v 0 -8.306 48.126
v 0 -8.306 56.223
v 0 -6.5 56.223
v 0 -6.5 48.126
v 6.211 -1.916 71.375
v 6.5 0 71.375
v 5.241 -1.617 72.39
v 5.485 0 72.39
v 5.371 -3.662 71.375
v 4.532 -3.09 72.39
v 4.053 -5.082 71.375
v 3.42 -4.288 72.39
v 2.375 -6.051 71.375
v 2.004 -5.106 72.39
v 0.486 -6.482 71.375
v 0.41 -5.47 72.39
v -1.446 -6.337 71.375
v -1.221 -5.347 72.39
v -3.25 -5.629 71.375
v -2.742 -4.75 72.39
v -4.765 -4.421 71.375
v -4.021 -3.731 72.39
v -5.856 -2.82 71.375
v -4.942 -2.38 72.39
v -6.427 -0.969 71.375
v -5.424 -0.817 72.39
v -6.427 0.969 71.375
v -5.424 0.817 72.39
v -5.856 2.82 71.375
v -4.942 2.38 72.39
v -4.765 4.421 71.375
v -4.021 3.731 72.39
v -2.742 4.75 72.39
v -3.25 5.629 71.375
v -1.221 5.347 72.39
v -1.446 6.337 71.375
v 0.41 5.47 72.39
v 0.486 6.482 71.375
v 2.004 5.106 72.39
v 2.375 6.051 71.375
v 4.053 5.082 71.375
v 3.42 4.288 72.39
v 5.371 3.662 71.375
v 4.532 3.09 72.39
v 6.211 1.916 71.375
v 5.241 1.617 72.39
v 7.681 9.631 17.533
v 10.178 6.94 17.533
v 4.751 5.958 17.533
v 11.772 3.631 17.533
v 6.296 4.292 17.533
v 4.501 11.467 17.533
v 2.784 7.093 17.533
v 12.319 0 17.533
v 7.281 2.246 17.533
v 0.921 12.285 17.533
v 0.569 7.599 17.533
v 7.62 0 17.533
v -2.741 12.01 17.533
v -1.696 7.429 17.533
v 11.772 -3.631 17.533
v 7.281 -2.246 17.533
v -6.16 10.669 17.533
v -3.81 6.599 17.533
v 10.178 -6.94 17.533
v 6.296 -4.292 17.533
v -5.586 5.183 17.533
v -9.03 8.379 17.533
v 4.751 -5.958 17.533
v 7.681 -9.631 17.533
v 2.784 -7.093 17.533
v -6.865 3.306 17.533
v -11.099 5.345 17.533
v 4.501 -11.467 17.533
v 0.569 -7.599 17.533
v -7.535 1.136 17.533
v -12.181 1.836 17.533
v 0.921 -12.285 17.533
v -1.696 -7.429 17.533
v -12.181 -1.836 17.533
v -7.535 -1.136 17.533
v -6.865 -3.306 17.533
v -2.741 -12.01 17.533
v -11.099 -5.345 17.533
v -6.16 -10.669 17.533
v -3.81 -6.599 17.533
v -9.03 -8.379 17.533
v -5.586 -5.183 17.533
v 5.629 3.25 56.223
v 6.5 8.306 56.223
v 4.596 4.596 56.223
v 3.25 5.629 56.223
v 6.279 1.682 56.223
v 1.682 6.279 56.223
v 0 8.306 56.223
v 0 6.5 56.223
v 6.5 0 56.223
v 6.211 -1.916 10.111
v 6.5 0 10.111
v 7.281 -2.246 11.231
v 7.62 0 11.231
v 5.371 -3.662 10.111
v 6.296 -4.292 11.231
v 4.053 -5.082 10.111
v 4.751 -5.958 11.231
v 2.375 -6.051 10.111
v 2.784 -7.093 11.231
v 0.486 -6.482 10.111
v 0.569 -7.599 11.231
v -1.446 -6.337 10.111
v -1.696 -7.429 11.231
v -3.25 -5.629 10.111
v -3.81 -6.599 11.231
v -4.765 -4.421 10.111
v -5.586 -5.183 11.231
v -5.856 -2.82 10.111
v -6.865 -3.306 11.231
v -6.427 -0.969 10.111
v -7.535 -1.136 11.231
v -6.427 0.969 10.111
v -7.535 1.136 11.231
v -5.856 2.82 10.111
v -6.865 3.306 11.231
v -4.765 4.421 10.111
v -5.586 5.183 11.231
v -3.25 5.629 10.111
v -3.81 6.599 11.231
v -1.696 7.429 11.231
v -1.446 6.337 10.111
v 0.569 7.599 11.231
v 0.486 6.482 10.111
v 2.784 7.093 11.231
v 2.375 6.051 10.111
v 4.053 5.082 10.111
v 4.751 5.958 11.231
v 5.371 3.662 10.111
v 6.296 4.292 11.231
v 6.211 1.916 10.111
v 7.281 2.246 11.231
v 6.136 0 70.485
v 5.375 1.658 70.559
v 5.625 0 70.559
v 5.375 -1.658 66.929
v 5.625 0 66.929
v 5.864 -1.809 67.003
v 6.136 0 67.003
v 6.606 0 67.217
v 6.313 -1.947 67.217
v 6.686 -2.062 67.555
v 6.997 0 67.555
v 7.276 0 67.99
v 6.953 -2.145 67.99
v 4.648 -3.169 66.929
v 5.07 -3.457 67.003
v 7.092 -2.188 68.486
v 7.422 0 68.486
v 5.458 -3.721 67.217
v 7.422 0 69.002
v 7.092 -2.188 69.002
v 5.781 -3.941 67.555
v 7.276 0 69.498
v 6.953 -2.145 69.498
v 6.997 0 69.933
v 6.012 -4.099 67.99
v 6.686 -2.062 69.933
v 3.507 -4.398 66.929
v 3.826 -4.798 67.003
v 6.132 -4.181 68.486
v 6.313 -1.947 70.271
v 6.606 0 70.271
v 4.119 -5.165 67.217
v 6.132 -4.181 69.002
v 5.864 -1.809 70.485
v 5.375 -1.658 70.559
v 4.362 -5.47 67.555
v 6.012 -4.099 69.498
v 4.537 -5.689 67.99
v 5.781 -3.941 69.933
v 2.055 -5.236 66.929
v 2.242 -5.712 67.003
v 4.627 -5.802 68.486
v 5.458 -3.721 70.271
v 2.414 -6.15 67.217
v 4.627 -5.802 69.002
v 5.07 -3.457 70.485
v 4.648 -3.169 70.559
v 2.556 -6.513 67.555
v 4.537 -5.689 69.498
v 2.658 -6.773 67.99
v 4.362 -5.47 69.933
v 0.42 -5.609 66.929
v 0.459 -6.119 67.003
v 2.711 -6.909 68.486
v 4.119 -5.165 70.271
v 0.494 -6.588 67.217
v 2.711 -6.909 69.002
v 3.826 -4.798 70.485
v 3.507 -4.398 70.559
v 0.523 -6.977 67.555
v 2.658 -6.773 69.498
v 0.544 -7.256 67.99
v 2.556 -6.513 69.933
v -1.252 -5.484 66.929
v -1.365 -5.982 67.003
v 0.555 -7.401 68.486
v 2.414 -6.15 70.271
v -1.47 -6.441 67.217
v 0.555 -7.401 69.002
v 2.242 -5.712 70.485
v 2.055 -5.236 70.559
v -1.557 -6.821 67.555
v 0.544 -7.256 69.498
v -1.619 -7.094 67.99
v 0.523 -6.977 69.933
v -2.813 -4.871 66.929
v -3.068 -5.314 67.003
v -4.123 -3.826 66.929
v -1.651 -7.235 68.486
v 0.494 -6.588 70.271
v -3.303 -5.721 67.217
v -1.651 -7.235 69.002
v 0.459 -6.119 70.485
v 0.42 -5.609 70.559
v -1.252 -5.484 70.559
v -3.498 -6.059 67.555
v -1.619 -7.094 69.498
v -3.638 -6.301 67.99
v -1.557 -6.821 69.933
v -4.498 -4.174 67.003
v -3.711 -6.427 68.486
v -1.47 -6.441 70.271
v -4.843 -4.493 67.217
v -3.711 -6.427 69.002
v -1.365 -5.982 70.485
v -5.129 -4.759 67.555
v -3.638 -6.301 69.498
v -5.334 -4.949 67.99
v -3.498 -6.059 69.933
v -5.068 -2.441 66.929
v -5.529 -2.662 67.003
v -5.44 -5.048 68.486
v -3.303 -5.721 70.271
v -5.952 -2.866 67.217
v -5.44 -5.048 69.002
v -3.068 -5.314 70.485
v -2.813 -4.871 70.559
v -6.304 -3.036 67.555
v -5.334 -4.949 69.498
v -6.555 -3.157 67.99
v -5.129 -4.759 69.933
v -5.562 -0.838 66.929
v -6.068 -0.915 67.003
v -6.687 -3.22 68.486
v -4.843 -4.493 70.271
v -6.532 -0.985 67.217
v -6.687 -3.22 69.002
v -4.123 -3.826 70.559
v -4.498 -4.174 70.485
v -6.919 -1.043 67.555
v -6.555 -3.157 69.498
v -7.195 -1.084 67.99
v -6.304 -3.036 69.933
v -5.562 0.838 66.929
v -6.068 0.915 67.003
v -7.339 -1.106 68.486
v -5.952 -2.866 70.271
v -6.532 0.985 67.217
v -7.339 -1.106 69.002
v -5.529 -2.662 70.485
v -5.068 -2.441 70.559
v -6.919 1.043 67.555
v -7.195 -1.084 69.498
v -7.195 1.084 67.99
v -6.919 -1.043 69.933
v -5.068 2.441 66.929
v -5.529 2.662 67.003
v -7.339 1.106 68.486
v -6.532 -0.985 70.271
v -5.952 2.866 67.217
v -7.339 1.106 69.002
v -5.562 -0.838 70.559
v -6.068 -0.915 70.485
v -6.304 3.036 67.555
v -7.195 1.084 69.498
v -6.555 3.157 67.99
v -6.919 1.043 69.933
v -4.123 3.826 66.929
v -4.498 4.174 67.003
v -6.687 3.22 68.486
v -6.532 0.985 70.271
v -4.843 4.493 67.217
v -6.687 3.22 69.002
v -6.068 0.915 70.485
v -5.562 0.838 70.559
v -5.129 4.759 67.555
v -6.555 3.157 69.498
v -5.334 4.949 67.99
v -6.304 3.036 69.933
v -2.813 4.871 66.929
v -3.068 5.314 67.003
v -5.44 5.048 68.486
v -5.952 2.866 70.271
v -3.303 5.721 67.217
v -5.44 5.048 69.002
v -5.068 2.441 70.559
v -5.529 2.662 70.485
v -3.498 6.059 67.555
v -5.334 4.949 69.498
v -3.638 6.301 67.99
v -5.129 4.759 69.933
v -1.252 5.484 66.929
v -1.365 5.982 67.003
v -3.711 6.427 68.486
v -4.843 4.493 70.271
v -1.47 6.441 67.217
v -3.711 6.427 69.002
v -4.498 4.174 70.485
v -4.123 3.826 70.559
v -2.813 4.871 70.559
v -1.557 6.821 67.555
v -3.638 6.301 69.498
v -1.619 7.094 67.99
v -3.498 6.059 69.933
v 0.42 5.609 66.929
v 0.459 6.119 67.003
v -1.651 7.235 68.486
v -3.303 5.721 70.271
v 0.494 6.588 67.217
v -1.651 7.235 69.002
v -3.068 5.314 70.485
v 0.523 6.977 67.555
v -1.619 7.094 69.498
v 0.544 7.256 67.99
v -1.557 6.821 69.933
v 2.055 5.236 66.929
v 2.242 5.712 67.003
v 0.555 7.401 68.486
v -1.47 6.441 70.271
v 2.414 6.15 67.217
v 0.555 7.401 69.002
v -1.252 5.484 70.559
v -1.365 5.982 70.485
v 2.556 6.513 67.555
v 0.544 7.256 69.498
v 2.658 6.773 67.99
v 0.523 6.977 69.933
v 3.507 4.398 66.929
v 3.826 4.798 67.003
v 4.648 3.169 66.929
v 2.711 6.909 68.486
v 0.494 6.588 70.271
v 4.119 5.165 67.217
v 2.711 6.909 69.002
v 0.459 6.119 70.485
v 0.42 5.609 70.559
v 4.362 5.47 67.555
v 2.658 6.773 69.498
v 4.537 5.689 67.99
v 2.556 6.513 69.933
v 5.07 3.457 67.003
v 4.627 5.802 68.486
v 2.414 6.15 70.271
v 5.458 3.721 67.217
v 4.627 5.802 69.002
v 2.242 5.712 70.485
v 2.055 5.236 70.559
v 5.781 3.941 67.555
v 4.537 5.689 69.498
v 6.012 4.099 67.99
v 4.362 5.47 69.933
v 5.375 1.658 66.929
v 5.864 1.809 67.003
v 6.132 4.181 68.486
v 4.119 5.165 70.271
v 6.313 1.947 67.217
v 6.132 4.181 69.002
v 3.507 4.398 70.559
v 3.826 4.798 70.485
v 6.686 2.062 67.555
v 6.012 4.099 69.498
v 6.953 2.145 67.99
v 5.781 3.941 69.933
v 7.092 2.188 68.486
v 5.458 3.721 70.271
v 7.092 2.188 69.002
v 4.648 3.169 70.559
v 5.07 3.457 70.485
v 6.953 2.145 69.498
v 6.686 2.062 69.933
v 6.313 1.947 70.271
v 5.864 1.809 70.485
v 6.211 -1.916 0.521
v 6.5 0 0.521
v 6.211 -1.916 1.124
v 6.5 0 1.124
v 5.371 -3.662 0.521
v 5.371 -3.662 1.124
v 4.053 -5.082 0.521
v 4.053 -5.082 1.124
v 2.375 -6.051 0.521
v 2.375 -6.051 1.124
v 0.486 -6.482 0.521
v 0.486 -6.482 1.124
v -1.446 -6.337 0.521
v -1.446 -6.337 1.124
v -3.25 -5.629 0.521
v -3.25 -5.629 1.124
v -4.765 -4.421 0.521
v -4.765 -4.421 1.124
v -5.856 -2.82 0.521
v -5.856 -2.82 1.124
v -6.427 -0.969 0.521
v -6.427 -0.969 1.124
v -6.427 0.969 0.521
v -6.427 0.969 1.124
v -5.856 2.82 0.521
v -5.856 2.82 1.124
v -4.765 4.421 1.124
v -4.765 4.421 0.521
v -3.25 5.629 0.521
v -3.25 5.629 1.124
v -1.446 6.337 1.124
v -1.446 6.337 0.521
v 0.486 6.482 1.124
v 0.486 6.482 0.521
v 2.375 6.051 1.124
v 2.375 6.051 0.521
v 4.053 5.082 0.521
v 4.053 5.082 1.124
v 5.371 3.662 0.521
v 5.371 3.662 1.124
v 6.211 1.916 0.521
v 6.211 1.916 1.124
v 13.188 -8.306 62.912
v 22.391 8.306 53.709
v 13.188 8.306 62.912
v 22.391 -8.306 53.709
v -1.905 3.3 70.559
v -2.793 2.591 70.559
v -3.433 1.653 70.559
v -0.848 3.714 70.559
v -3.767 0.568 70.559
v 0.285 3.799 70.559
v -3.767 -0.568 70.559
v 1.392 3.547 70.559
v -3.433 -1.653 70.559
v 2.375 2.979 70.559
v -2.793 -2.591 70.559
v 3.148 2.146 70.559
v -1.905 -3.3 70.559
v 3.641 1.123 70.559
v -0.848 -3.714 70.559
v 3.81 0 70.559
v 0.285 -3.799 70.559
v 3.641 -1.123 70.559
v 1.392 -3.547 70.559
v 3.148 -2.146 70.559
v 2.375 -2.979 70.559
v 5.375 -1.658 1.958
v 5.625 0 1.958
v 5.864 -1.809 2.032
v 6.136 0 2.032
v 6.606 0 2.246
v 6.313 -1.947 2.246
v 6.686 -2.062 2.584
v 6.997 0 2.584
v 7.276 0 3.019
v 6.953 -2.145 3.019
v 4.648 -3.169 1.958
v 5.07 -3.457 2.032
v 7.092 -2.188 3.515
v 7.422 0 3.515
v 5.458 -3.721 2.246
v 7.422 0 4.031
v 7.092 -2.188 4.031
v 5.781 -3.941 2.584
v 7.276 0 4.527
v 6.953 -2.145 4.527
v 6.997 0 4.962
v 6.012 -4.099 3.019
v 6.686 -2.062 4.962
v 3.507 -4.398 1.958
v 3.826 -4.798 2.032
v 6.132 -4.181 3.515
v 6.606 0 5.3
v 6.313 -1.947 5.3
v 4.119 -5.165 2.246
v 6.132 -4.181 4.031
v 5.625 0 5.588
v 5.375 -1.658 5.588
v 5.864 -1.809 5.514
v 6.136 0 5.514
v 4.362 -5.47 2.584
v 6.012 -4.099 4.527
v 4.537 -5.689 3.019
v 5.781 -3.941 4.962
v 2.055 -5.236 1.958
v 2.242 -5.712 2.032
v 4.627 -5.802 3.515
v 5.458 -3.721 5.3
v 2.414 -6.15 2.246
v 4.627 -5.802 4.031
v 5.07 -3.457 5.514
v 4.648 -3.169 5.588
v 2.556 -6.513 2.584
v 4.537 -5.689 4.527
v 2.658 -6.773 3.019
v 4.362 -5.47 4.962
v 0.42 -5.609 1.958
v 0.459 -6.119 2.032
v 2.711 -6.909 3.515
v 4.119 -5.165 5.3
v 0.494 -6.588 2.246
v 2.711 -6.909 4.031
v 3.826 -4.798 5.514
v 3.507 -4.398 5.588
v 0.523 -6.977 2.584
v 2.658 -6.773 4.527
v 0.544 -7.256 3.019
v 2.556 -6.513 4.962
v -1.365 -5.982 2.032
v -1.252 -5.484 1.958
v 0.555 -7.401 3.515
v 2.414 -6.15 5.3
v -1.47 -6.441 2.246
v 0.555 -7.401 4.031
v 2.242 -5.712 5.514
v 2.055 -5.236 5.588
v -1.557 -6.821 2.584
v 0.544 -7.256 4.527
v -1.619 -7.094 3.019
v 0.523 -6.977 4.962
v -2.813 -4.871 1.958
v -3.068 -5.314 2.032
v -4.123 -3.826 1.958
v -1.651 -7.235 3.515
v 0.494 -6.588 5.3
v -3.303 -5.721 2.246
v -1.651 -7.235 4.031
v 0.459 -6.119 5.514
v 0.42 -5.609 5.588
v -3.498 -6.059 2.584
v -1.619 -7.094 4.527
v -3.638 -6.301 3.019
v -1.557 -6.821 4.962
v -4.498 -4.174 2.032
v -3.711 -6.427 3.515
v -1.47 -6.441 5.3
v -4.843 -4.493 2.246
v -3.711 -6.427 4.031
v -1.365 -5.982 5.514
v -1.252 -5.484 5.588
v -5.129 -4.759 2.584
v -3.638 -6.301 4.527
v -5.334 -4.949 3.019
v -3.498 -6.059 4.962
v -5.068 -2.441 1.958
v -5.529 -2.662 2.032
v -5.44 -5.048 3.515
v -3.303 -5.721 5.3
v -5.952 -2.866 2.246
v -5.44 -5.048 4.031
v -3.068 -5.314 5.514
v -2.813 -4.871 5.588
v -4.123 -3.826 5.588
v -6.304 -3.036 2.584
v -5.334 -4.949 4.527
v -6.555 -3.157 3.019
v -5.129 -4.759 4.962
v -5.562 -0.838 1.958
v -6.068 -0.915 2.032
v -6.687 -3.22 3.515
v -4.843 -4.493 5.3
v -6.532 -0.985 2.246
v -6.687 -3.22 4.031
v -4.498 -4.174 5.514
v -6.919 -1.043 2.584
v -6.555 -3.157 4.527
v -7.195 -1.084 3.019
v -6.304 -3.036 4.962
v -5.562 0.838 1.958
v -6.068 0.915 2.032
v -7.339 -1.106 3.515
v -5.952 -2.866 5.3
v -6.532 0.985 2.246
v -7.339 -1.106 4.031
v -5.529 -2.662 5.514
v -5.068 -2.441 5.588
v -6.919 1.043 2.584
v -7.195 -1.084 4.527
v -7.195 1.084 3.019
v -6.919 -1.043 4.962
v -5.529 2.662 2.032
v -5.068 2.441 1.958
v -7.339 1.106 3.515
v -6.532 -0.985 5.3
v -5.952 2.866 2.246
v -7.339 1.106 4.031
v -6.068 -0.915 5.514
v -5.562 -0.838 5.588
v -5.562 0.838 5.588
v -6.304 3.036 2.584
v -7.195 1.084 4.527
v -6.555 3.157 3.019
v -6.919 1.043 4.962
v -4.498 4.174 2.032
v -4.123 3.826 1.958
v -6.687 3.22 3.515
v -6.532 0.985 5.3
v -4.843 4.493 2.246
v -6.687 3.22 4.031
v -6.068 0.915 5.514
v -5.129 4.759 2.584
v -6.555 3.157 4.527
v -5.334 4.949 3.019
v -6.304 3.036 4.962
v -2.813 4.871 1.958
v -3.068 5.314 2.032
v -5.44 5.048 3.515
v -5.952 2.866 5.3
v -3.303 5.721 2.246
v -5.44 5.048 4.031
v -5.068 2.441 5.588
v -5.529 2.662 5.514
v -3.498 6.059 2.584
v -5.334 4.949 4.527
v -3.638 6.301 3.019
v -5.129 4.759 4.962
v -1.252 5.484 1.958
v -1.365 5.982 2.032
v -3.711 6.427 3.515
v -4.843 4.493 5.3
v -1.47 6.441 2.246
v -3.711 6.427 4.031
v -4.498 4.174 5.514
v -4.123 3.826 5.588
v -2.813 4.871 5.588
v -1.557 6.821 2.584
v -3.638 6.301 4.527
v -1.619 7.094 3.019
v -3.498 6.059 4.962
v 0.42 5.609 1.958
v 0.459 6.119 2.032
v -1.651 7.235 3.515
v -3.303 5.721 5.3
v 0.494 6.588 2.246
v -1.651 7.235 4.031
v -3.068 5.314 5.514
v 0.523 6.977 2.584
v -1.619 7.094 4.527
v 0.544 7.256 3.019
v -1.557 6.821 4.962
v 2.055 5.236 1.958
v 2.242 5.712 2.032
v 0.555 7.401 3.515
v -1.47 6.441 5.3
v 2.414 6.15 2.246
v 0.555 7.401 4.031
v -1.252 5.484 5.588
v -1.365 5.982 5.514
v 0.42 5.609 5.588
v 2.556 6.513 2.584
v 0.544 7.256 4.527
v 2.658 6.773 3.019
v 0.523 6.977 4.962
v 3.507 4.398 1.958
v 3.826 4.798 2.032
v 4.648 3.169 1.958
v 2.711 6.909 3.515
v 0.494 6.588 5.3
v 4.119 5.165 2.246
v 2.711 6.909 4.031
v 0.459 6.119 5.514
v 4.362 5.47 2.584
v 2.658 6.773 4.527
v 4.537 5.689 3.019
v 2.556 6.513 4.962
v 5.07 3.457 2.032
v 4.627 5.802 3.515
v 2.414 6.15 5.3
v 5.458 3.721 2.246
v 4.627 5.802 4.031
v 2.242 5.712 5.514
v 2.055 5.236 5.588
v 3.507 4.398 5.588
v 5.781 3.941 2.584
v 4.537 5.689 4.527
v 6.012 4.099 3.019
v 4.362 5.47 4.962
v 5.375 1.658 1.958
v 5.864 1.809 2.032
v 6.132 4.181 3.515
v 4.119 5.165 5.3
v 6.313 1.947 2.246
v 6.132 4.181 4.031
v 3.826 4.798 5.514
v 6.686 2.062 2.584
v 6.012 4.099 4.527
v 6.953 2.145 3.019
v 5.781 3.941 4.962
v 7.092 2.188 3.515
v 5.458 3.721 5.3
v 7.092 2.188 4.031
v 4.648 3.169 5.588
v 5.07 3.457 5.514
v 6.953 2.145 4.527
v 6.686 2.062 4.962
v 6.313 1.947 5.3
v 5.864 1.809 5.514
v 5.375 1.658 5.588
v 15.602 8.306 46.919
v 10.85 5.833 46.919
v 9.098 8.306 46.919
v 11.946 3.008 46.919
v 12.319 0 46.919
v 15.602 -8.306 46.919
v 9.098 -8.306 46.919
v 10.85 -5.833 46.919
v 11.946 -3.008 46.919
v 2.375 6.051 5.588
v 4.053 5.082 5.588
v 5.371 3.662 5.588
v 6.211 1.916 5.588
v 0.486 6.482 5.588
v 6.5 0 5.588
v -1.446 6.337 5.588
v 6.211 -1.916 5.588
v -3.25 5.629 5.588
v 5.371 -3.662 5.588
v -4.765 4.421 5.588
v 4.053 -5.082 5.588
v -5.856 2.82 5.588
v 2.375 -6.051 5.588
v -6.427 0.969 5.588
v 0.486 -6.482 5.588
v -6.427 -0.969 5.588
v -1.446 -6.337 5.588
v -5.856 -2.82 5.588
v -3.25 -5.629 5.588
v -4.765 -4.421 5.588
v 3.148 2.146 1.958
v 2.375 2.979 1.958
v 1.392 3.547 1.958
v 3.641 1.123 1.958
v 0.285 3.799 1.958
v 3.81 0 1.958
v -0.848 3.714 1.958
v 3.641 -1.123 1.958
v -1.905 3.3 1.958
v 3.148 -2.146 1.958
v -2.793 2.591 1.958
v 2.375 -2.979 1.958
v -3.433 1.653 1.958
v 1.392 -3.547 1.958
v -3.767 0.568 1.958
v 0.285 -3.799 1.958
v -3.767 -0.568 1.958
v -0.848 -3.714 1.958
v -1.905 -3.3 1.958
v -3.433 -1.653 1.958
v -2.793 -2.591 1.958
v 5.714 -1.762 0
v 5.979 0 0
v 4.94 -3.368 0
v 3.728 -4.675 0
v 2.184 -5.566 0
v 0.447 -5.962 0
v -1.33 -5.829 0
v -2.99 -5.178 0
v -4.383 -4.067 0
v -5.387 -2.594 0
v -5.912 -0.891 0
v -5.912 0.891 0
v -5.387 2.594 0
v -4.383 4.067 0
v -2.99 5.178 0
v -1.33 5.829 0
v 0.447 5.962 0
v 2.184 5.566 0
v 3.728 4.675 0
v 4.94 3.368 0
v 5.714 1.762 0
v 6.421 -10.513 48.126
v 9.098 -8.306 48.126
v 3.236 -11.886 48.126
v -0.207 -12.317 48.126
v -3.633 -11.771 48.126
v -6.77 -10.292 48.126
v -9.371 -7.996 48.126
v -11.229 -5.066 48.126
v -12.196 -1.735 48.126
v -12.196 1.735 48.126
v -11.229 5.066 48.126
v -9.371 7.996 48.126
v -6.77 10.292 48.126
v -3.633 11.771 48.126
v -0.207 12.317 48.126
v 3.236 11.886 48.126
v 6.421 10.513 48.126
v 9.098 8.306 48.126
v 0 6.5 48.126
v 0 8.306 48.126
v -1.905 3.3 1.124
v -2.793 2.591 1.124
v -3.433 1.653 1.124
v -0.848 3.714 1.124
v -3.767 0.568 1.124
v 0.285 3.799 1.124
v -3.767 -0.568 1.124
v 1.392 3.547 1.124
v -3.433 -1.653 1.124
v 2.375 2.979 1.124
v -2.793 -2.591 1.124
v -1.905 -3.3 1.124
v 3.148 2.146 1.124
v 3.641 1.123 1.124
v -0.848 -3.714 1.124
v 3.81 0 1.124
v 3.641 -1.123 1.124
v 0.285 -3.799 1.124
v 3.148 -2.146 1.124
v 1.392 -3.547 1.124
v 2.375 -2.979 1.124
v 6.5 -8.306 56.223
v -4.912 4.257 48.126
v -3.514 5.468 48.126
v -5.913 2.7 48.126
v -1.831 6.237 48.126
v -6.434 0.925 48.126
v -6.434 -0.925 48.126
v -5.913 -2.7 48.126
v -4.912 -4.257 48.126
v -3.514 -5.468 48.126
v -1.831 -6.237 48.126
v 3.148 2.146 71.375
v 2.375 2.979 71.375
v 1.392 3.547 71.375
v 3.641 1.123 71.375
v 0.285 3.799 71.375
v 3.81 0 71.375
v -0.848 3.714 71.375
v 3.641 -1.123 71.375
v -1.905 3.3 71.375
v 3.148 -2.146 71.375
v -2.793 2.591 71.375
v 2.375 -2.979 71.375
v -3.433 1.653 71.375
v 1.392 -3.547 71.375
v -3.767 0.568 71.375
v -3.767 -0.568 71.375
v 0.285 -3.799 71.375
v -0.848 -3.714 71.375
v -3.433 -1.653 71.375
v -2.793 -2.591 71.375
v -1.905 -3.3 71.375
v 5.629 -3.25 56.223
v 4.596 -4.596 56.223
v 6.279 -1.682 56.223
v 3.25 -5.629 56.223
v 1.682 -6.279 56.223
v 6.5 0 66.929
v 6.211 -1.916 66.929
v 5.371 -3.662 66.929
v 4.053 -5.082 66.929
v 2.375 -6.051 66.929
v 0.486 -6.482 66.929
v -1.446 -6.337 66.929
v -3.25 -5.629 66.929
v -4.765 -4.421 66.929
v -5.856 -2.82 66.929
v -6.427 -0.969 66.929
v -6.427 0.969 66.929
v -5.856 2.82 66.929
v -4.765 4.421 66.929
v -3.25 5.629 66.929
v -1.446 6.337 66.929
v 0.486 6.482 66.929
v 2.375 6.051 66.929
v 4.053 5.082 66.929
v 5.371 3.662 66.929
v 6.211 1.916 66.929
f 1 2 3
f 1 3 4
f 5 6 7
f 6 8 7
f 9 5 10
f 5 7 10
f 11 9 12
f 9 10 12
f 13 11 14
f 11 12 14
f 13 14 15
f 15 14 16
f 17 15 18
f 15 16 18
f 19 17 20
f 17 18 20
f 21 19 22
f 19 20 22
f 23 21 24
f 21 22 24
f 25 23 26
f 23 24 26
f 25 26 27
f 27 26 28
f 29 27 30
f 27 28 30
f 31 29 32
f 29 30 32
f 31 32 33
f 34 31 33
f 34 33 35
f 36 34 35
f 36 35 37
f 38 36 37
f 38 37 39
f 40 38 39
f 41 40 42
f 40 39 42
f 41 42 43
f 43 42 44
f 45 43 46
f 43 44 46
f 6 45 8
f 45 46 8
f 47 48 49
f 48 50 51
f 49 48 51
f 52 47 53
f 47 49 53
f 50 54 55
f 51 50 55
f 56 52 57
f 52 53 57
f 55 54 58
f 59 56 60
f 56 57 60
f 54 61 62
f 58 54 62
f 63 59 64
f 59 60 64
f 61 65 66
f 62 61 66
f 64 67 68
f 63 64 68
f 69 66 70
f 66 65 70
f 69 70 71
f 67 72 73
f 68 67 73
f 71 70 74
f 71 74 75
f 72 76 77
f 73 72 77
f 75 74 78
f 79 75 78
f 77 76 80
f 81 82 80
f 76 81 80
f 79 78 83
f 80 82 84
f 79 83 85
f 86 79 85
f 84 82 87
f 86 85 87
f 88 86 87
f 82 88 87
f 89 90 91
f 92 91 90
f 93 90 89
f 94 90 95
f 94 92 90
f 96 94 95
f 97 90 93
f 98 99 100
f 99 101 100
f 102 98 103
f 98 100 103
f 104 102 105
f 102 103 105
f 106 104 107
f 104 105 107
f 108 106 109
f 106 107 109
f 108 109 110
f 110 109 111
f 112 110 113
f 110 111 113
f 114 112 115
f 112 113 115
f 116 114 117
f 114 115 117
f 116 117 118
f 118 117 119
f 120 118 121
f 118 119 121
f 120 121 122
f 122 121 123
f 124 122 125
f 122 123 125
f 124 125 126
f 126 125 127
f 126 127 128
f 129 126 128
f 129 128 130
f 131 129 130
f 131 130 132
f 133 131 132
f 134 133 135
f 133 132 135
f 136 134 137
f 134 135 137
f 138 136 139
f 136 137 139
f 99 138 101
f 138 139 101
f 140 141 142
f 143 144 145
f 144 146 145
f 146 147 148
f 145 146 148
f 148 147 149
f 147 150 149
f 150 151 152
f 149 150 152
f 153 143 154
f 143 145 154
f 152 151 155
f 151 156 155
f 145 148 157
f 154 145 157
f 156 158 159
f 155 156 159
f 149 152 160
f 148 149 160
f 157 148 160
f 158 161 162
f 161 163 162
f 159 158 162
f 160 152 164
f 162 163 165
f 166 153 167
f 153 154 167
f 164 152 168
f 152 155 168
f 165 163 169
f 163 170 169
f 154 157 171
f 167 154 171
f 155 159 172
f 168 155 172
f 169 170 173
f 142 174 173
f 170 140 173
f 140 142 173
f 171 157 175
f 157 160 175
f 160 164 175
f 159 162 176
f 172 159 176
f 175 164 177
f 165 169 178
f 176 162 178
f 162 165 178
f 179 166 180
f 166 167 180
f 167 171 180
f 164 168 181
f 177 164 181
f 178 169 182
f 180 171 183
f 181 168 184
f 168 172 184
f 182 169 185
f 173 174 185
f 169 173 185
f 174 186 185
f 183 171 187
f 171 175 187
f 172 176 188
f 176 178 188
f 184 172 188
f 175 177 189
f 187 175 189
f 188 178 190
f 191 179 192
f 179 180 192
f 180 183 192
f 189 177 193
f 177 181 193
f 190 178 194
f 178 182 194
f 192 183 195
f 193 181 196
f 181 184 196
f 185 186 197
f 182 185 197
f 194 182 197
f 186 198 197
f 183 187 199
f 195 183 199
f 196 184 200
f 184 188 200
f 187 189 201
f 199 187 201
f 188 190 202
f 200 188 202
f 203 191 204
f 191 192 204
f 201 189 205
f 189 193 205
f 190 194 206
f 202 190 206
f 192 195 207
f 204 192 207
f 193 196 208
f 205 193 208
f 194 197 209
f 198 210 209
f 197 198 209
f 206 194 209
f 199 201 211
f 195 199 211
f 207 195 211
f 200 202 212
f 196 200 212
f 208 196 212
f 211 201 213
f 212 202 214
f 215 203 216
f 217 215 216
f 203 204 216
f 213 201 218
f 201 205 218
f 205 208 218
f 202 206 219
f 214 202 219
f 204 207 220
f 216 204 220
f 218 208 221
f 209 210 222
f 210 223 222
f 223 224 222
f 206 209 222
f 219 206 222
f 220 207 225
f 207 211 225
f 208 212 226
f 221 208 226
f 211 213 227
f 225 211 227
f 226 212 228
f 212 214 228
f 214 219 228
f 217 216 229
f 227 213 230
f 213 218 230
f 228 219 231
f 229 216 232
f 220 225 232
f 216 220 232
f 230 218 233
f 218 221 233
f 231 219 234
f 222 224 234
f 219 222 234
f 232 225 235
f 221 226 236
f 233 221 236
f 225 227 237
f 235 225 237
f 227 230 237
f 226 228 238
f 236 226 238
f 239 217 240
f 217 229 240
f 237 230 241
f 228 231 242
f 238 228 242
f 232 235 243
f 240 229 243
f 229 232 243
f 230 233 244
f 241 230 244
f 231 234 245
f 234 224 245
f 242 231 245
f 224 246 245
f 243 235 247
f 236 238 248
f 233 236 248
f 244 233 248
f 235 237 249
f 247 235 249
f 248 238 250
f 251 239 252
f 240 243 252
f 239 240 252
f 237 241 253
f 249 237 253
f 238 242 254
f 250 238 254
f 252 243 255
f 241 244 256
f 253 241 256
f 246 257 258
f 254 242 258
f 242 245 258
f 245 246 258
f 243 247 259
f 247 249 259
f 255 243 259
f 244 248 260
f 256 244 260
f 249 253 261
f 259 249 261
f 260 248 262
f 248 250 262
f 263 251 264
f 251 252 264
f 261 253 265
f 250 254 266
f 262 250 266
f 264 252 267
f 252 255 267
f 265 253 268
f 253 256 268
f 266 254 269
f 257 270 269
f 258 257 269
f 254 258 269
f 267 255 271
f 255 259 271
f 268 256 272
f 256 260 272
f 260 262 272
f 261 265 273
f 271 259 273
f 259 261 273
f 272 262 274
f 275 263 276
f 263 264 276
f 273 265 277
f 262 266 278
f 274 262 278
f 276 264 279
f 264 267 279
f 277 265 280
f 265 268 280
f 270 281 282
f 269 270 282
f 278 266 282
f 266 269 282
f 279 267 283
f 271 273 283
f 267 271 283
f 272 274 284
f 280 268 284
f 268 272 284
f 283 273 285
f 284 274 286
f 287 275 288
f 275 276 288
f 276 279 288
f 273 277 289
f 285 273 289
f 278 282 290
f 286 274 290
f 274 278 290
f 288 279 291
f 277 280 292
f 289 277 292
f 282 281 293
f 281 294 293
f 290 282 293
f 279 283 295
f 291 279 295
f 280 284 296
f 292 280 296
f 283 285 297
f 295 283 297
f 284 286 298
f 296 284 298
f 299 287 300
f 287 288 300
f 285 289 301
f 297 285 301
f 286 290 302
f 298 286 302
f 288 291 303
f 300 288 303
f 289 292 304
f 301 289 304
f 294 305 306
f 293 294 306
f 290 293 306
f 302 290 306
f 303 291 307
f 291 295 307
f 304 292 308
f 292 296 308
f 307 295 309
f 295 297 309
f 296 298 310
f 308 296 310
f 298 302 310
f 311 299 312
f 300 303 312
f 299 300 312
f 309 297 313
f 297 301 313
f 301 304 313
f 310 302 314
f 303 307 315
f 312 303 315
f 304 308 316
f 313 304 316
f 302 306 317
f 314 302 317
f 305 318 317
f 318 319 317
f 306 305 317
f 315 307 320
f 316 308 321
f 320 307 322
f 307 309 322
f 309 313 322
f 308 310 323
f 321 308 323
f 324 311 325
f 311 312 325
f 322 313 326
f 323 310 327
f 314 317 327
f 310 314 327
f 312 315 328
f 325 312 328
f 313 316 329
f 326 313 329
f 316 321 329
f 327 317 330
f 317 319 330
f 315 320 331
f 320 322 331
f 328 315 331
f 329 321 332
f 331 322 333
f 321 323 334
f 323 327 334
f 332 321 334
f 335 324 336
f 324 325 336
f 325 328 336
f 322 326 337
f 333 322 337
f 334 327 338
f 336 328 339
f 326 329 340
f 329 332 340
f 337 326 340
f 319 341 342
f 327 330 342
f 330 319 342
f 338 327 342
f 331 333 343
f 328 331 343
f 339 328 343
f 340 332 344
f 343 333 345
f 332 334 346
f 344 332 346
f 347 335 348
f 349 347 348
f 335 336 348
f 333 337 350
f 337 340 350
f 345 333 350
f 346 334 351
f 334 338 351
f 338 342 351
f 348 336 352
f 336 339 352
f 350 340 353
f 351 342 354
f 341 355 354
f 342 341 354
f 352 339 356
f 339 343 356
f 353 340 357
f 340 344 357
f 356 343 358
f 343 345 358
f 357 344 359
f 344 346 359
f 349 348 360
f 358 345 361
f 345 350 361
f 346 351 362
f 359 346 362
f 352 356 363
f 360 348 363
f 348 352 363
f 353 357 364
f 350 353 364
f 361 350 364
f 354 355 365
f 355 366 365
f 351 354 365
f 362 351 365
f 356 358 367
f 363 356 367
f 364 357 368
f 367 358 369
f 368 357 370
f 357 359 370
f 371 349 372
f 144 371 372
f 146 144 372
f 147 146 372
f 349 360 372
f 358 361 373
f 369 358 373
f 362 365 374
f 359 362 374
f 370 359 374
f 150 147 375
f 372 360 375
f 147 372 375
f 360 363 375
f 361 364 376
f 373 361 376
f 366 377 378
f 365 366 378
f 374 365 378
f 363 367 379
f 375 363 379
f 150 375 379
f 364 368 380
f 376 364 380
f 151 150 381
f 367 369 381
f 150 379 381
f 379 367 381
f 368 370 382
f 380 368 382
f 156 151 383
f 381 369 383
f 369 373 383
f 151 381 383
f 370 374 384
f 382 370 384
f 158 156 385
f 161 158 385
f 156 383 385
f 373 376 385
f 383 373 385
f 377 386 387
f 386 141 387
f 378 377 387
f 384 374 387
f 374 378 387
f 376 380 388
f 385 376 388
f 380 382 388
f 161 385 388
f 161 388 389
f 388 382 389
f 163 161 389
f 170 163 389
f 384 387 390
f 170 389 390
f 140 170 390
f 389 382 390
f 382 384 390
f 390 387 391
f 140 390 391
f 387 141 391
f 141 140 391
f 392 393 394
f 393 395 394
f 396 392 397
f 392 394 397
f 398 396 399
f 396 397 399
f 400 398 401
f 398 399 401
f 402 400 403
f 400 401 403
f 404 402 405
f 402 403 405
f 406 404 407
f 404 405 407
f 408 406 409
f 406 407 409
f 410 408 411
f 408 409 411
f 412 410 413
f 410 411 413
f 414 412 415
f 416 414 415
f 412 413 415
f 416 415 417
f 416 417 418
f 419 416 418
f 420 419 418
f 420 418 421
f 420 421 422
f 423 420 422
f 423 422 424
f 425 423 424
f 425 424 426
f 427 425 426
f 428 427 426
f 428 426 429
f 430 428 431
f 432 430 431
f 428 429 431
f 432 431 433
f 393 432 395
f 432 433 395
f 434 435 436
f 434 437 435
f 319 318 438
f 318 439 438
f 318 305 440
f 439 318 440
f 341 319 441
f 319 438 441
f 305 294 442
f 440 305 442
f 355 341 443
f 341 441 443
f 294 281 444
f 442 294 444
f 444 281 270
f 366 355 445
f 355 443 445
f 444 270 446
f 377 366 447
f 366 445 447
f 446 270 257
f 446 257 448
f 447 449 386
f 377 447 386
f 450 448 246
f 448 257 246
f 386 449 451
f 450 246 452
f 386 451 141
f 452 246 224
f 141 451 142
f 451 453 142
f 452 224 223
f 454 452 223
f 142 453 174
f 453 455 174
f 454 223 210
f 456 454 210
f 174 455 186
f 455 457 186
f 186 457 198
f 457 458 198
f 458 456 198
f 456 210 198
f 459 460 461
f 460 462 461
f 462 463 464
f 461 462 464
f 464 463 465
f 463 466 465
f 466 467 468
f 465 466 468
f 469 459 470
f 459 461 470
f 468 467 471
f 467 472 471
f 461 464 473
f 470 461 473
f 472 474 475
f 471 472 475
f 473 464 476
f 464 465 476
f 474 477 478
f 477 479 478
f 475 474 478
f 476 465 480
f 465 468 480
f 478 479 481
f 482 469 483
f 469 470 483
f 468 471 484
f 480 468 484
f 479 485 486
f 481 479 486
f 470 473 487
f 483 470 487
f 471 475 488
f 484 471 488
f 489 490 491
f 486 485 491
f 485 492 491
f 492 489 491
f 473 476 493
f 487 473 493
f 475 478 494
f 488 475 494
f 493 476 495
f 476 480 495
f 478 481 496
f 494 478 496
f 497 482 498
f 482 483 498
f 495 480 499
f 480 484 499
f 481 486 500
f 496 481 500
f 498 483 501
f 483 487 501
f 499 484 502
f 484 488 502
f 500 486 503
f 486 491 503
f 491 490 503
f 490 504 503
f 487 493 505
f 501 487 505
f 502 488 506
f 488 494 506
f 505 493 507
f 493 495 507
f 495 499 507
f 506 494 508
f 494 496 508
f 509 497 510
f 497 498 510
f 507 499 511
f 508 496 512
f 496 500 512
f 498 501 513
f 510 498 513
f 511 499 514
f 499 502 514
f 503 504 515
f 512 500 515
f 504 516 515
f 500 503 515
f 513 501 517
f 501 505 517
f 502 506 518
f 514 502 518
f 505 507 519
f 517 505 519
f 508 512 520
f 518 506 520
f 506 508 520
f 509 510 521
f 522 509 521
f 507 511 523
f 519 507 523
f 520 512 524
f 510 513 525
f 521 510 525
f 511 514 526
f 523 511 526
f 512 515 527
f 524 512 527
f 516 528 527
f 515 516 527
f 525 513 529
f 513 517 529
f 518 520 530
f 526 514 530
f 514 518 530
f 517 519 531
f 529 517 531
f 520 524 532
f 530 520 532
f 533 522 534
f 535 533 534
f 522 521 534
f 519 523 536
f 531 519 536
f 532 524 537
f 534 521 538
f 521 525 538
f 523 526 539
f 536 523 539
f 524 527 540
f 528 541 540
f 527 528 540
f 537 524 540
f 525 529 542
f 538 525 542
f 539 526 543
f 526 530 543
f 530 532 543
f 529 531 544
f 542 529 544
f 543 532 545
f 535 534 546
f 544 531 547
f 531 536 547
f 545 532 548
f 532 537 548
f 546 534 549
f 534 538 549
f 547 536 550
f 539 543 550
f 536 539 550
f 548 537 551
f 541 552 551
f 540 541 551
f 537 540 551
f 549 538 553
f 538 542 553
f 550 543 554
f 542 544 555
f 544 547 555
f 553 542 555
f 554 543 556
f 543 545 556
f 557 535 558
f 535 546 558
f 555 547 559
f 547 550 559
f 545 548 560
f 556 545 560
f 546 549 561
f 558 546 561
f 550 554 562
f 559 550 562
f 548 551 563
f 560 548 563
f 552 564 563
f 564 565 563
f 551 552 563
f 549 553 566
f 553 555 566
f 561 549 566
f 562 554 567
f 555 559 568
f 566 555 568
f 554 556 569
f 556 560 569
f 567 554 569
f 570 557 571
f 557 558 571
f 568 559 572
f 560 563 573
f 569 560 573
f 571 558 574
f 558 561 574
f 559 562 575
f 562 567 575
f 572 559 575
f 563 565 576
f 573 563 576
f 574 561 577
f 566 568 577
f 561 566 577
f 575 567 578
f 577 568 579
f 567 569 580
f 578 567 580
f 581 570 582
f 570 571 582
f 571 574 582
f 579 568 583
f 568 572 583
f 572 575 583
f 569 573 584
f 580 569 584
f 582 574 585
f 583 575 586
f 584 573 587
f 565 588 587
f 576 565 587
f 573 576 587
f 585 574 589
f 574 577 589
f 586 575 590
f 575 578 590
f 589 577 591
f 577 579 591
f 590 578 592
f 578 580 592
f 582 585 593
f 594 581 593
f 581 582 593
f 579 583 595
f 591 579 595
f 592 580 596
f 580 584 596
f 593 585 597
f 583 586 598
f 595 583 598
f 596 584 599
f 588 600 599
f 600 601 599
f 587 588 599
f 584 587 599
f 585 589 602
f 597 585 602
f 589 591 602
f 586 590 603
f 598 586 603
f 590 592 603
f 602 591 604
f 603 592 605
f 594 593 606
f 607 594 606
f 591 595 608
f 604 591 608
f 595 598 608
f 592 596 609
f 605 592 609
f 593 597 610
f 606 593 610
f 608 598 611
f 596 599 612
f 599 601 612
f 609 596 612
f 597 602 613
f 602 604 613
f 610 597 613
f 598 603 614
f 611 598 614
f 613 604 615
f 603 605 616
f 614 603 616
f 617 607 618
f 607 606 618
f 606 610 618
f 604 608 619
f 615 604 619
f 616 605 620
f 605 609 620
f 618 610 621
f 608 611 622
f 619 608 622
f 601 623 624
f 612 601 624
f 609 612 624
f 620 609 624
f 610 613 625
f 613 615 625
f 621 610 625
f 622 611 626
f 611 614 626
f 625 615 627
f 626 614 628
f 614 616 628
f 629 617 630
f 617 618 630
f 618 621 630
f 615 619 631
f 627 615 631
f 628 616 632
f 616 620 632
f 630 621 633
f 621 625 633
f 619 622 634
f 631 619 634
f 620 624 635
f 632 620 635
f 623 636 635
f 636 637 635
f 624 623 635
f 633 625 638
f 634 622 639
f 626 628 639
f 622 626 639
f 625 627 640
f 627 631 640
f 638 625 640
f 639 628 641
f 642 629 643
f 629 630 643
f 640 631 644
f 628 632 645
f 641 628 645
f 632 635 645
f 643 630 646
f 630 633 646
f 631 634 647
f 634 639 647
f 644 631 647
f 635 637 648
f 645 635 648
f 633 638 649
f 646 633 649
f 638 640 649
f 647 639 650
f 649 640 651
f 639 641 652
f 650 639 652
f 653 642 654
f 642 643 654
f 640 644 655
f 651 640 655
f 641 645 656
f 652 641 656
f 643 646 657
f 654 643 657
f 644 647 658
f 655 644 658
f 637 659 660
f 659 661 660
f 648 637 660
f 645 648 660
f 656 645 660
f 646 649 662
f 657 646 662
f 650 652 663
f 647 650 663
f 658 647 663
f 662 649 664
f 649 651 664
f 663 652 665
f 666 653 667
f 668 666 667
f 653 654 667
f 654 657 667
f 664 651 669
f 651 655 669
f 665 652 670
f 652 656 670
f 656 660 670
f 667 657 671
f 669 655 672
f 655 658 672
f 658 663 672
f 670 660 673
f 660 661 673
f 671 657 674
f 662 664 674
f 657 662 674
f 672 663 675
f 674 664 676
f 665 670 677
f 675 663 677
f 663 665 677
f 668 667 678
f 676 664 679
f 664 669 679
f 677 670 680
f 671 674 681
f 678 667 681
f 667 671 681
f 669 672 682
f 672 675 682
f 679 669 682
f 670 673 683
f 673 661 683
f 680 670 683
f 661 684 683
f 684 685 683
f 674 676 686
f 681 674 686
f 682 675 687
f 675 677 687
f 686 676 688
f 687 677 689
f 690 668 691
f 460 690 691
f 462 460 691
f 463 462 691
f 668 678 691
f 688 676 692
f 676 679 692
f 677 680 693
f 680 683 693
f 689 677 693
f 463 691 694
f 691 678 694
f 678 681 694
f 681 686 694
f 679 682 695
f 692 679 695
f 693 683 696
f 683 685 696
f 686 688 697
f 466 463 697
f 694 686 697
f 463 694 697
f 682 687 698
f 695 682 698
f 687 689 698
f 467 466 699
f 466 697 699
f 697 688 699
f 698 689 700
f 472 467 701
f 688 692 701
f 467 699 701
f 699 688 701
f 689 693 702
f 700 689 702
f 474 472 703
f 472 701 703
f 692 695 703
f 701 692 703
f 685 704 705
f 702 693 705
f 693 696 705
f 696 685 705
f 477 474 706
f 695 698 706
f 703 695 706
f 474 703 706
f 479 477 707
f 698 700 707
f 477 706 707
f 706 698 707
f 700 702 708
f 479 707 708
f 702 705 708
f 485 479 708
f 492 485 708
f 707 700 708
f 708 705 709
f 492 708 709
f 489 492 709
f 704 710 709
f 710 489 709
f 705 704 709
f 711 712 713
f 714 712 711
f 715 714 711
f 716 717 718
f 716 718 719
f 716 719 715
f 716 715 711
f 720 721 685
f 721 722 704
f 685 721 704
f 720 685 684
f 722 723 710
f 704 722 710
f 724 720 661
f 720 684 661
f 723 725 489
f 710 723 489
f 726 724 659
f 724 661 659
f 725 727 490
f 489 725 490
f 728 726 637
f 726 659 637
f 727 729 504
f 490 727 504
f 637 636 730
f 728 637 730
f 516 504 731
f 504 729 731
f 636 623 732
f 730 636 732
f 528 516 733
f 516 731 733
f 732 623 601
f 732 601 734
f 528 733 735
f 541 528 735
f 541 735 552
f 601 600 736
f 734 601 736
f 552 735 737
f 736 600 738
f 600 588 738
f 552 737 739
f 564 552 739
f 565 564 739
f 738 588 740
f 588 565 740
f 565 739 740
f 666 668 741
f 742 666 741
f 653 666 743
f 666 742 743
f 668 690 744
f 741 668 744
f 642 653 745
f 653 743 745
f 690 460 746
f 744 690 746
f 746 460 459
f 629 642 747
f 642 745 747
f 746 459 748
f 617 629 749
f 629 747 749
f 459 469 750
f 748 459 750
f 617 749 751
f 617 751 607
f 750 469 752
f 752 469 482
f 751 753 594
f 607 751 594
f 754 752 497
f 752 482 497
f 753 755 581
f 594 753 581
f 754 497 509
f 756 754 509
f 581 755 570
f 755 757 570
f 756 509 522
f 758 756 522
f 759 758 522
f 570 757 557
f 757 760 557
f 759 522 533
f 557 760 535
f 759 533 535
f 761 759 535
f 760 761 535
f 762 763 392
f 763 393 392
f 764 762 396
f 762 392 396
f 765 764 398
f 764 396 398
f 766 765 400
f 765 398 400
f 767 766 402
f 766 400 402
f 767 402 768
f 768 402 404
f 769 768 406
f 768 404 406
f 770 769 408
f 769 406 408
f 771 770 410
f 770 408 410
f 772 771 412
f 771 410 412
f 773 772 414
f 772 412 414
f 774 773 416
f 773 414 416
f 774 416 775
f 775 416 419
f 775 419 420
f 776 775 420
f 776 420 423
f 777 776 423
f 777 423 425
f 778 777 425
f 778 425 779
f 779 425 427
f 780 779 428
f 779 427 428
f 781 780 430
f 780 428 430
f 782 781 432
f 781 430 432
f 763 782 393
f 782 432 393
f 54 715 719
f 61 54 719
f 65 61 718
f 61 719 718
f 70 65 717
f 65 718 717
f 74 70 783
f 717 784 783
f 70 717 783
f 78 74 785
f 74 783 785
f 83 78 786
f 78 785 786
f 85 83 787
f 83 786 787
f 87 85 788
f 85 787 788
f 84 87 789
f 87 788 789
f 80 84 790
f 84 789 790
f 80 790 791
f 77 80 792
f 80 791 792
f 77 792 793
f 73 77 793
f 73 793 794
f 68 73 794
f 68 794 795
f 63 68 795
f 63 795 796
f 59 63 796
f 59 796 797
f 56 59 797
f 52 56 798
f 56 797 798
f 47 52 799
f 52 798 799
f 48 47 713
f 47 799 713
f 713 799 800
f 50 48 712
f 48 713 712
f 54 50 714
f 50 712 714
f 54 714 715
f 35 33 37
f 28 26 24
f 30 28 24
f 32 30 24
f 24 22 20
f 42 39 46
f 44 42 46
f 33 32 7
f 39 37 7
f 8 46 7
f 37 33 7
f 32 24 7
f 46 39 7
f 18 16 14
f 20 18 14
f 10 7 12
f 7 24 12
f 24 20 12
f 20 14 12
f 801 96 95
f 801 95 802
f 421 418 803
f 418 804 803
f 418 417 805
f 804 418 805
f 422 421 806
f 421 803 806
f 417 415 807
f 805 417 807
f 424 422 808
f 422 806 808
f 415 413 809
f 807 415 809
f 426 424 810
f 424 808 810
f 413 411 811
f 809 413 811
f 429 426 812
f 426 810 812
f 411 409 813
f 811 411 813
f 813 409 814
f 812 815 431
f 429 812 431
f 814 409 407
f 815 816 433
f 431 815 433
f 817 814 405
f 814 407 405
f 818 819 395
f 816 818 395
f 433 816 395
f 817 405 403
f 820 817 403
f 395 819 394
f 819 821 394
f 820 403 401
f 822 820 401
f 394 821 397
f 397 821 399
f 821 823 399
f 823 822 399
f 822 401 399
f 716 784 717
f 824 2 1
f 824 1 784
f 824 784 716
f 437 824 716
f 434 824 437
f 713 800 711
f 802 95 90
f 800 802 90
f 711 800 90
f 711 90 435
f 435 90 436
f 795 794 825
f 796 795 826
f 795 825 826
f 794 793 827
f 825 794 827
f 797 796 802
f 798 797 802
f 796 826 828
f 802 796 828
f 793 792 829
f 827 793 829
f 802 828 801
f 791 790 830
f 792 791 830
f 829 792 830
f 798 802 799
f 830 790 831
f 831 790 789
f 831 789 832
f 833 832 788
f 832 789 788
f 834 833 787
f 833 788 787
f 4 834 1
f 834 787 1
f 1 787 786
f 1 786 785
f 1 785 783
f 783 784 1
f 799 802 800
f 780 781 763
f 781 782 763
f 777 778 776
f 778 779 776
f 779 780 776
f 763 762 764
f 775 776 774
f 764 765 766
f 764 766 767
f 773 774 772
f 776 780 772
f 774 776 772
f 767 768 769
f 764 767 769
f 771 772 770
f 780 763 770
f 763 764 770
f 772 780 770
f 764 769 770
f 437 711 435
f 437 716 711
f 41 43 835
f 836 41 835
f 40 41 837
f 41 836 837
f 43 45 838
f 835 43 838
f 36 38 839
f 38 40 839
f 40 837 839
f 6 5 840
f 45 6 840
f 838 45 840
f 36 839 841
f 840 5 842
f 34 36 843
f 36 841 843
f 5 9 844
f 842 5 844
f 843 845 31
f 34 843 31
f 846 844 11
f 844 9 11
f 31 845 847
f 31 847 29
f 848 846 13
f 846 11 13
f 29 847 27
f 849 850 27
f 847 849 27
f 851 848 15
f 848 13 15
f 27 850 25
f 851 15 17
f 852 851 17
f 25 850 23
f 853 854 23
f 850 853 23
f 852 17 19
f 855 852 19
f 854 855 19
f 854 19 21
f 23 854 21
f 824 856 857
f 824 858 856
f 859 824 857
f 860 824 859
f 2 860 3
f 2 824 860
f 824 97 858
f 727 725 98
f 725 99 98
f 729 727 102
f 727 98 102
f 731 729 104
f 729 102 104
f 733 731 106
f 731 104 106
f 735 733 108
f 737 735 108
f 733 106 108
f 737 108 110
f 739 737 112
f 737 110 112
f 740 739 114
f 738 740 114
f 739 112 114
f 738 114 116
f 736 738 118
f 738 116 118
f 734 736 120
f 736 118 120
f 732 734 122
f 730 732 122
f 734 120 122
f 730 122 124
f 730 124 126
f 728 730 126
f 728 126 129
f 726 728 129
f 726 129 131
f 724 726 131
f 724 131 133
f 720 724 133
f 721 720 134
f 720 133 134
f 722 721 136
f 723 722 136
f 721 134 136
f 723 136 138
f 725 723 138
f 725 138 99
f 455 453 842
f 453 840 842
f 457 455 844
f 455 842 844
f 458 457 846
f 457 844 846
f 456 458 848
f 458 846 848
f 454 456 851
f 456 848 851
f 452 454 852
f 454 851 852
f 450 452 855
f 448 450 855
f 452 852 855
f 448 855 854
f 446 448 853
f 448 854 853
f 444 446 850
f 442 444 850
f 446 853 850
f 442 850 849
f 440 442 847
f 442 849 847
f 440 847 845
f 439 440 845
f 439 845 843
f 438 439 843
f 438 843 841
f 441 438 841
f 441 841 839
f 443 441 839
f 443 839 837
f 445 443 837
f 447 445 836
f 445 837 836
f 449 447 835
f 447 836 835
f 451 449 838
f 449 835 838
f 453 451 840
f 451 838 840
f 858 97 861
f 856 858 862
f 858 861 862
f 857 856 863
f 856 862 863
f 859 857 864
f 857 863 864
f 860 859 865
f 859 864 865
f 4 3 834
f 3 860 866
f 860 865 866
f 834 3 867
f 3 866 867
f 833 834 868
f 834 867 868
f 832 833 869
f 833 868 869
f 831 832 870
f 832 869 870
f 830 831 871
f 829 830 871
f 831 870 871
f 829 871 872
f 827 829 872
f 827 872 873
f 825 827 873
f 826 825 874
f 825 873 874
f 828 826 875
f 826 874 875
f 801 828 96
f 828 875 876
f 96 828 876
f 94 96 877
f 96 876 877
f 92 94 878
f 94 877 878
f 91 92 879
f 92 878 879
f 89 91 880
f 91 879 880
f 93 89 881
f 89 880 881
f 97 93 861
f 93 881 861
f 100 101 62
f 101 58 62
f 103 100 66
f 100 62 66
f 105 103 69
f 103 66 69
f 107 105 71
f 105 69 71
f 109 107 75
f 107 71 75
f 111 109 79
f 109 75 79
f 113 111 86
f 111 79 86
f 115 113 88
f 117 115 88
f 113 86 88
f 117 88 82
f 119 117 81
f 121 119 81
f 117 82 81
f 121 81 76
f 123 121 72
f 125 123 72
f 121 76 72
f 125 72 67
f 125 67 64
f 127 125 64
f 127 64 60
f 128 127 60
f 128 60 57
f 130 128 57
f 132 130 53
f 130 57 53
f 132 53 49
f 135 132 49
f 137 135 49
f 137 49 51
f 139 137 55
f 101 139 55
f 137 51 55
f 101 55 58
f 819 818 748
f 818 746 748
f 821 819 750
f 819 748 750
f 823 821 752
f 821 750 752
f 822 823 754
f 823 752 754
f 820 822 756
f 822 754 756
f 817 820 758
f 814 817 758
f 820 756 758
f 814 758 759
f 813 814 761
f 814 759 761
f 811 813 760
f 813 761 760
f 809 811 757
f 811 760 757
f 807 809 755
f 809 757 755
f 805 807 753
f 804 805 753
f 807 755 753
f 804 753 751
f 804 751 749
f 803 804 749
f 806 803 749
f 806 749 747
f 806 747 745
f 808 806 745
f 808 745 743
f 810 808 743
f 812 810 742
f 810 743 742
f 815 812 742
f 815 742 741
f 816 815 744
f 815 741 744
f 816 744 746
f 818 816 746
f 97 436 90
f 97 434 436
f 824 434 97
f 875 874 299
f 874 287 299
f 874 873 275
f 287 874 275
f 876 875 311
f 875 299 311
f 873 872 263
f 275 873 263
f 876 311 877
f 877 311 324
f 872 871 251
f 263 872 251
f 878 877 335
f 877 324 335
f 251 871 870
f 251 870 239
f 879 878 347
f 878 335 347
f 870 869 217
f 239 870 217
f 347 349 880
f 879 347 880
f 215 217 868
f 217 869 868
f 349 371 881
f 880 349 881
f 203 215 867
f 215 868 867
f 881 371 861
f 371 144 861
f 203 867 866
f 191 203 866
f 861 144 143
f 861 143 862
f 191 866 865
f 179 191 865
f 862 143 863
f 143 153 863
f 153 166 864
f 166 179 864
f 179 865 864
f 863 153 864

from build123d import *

# Parameters (mm, degrees)
F3_DEPTH = 8.3058


with BuildPart() as f1:
    # F0 (on Front) → F1 (revolve)
    with BuildSketch(Plane.XZ):
        with BuildLine():
            Line((5.4849602437, 72.39), (0, 72.39))
            Line((0, 72.39), (0, 0))
            Line((0, 0), (5.9791589156, 0))
            Line((5.9791589156, 0), (6.5, 0.5208410844))
            Line((6.5, 0.5208410844), (6.5, 1.1235540733))
            Line((6.5, 1.1235540733), (3.81, 1.1235540733))
            Line((3.81, 1.1235540733), (3.81, 1.958))
            Line((3.81, 1.958), (5.625, 1.958))
            ThreePointArc((5.625, 1.958), (7.44, 3.773), (5.625, 5.588))
            Line((5.625, 5.588), (6.5, 5.588))
            Line((6.5, 5.588), (6.5, 10.1114138961))
            Line((6.5, 10.1114138961), (7.62, 11.2314138961))
            Line((7.62, 11.2314138961), (7.62, 17.5331309438))
            Line((7.62, 17.5331309438), (12.319, 17.5331309438))
            Line((12.319, 17.5331309438), (12.319, 48.1258220971))
            Line((12.319, 48.1258220971), (6.5, 48.1258220971))
            Line((6.5, 48.1258220971), (6.5, 66.929))
            Line((6.5, 66.929), (5.625, 66.929))
            ThreePointArc((5.625, 66.929), (7.44, 68.744), (5.625, 70.559))
            Line((5.625, 70.559), (3.81, 70.559))
            Line((3.81, 70.559), (3.81, 71.3749602437))
            Line((3.81, 71.3749602437), (6.5, 71.3749602437))
            Line((6.5, 71.3749602437), (5.4849602437, 72.39))
        make_face()
    revolve(axis=Axis((0, 0, 36.195), (0, 0, -1)))

    # F2 (on Front) → F3 (join, symmetric)
    with BuildSketch(Plane.XZ):
        Polygon((13.188126497, 62.9115402699), (6.5, 56.2234137729), (0, 56.2234137729), (0, 46.9192864976), (12.319, 46.9192864976), (15.6018657007, 46.9192864976), (22.391122985, 53.7085437818), align=None)
    extrude(amount=F3_DEPTH, both=True)


solid = f1.part
